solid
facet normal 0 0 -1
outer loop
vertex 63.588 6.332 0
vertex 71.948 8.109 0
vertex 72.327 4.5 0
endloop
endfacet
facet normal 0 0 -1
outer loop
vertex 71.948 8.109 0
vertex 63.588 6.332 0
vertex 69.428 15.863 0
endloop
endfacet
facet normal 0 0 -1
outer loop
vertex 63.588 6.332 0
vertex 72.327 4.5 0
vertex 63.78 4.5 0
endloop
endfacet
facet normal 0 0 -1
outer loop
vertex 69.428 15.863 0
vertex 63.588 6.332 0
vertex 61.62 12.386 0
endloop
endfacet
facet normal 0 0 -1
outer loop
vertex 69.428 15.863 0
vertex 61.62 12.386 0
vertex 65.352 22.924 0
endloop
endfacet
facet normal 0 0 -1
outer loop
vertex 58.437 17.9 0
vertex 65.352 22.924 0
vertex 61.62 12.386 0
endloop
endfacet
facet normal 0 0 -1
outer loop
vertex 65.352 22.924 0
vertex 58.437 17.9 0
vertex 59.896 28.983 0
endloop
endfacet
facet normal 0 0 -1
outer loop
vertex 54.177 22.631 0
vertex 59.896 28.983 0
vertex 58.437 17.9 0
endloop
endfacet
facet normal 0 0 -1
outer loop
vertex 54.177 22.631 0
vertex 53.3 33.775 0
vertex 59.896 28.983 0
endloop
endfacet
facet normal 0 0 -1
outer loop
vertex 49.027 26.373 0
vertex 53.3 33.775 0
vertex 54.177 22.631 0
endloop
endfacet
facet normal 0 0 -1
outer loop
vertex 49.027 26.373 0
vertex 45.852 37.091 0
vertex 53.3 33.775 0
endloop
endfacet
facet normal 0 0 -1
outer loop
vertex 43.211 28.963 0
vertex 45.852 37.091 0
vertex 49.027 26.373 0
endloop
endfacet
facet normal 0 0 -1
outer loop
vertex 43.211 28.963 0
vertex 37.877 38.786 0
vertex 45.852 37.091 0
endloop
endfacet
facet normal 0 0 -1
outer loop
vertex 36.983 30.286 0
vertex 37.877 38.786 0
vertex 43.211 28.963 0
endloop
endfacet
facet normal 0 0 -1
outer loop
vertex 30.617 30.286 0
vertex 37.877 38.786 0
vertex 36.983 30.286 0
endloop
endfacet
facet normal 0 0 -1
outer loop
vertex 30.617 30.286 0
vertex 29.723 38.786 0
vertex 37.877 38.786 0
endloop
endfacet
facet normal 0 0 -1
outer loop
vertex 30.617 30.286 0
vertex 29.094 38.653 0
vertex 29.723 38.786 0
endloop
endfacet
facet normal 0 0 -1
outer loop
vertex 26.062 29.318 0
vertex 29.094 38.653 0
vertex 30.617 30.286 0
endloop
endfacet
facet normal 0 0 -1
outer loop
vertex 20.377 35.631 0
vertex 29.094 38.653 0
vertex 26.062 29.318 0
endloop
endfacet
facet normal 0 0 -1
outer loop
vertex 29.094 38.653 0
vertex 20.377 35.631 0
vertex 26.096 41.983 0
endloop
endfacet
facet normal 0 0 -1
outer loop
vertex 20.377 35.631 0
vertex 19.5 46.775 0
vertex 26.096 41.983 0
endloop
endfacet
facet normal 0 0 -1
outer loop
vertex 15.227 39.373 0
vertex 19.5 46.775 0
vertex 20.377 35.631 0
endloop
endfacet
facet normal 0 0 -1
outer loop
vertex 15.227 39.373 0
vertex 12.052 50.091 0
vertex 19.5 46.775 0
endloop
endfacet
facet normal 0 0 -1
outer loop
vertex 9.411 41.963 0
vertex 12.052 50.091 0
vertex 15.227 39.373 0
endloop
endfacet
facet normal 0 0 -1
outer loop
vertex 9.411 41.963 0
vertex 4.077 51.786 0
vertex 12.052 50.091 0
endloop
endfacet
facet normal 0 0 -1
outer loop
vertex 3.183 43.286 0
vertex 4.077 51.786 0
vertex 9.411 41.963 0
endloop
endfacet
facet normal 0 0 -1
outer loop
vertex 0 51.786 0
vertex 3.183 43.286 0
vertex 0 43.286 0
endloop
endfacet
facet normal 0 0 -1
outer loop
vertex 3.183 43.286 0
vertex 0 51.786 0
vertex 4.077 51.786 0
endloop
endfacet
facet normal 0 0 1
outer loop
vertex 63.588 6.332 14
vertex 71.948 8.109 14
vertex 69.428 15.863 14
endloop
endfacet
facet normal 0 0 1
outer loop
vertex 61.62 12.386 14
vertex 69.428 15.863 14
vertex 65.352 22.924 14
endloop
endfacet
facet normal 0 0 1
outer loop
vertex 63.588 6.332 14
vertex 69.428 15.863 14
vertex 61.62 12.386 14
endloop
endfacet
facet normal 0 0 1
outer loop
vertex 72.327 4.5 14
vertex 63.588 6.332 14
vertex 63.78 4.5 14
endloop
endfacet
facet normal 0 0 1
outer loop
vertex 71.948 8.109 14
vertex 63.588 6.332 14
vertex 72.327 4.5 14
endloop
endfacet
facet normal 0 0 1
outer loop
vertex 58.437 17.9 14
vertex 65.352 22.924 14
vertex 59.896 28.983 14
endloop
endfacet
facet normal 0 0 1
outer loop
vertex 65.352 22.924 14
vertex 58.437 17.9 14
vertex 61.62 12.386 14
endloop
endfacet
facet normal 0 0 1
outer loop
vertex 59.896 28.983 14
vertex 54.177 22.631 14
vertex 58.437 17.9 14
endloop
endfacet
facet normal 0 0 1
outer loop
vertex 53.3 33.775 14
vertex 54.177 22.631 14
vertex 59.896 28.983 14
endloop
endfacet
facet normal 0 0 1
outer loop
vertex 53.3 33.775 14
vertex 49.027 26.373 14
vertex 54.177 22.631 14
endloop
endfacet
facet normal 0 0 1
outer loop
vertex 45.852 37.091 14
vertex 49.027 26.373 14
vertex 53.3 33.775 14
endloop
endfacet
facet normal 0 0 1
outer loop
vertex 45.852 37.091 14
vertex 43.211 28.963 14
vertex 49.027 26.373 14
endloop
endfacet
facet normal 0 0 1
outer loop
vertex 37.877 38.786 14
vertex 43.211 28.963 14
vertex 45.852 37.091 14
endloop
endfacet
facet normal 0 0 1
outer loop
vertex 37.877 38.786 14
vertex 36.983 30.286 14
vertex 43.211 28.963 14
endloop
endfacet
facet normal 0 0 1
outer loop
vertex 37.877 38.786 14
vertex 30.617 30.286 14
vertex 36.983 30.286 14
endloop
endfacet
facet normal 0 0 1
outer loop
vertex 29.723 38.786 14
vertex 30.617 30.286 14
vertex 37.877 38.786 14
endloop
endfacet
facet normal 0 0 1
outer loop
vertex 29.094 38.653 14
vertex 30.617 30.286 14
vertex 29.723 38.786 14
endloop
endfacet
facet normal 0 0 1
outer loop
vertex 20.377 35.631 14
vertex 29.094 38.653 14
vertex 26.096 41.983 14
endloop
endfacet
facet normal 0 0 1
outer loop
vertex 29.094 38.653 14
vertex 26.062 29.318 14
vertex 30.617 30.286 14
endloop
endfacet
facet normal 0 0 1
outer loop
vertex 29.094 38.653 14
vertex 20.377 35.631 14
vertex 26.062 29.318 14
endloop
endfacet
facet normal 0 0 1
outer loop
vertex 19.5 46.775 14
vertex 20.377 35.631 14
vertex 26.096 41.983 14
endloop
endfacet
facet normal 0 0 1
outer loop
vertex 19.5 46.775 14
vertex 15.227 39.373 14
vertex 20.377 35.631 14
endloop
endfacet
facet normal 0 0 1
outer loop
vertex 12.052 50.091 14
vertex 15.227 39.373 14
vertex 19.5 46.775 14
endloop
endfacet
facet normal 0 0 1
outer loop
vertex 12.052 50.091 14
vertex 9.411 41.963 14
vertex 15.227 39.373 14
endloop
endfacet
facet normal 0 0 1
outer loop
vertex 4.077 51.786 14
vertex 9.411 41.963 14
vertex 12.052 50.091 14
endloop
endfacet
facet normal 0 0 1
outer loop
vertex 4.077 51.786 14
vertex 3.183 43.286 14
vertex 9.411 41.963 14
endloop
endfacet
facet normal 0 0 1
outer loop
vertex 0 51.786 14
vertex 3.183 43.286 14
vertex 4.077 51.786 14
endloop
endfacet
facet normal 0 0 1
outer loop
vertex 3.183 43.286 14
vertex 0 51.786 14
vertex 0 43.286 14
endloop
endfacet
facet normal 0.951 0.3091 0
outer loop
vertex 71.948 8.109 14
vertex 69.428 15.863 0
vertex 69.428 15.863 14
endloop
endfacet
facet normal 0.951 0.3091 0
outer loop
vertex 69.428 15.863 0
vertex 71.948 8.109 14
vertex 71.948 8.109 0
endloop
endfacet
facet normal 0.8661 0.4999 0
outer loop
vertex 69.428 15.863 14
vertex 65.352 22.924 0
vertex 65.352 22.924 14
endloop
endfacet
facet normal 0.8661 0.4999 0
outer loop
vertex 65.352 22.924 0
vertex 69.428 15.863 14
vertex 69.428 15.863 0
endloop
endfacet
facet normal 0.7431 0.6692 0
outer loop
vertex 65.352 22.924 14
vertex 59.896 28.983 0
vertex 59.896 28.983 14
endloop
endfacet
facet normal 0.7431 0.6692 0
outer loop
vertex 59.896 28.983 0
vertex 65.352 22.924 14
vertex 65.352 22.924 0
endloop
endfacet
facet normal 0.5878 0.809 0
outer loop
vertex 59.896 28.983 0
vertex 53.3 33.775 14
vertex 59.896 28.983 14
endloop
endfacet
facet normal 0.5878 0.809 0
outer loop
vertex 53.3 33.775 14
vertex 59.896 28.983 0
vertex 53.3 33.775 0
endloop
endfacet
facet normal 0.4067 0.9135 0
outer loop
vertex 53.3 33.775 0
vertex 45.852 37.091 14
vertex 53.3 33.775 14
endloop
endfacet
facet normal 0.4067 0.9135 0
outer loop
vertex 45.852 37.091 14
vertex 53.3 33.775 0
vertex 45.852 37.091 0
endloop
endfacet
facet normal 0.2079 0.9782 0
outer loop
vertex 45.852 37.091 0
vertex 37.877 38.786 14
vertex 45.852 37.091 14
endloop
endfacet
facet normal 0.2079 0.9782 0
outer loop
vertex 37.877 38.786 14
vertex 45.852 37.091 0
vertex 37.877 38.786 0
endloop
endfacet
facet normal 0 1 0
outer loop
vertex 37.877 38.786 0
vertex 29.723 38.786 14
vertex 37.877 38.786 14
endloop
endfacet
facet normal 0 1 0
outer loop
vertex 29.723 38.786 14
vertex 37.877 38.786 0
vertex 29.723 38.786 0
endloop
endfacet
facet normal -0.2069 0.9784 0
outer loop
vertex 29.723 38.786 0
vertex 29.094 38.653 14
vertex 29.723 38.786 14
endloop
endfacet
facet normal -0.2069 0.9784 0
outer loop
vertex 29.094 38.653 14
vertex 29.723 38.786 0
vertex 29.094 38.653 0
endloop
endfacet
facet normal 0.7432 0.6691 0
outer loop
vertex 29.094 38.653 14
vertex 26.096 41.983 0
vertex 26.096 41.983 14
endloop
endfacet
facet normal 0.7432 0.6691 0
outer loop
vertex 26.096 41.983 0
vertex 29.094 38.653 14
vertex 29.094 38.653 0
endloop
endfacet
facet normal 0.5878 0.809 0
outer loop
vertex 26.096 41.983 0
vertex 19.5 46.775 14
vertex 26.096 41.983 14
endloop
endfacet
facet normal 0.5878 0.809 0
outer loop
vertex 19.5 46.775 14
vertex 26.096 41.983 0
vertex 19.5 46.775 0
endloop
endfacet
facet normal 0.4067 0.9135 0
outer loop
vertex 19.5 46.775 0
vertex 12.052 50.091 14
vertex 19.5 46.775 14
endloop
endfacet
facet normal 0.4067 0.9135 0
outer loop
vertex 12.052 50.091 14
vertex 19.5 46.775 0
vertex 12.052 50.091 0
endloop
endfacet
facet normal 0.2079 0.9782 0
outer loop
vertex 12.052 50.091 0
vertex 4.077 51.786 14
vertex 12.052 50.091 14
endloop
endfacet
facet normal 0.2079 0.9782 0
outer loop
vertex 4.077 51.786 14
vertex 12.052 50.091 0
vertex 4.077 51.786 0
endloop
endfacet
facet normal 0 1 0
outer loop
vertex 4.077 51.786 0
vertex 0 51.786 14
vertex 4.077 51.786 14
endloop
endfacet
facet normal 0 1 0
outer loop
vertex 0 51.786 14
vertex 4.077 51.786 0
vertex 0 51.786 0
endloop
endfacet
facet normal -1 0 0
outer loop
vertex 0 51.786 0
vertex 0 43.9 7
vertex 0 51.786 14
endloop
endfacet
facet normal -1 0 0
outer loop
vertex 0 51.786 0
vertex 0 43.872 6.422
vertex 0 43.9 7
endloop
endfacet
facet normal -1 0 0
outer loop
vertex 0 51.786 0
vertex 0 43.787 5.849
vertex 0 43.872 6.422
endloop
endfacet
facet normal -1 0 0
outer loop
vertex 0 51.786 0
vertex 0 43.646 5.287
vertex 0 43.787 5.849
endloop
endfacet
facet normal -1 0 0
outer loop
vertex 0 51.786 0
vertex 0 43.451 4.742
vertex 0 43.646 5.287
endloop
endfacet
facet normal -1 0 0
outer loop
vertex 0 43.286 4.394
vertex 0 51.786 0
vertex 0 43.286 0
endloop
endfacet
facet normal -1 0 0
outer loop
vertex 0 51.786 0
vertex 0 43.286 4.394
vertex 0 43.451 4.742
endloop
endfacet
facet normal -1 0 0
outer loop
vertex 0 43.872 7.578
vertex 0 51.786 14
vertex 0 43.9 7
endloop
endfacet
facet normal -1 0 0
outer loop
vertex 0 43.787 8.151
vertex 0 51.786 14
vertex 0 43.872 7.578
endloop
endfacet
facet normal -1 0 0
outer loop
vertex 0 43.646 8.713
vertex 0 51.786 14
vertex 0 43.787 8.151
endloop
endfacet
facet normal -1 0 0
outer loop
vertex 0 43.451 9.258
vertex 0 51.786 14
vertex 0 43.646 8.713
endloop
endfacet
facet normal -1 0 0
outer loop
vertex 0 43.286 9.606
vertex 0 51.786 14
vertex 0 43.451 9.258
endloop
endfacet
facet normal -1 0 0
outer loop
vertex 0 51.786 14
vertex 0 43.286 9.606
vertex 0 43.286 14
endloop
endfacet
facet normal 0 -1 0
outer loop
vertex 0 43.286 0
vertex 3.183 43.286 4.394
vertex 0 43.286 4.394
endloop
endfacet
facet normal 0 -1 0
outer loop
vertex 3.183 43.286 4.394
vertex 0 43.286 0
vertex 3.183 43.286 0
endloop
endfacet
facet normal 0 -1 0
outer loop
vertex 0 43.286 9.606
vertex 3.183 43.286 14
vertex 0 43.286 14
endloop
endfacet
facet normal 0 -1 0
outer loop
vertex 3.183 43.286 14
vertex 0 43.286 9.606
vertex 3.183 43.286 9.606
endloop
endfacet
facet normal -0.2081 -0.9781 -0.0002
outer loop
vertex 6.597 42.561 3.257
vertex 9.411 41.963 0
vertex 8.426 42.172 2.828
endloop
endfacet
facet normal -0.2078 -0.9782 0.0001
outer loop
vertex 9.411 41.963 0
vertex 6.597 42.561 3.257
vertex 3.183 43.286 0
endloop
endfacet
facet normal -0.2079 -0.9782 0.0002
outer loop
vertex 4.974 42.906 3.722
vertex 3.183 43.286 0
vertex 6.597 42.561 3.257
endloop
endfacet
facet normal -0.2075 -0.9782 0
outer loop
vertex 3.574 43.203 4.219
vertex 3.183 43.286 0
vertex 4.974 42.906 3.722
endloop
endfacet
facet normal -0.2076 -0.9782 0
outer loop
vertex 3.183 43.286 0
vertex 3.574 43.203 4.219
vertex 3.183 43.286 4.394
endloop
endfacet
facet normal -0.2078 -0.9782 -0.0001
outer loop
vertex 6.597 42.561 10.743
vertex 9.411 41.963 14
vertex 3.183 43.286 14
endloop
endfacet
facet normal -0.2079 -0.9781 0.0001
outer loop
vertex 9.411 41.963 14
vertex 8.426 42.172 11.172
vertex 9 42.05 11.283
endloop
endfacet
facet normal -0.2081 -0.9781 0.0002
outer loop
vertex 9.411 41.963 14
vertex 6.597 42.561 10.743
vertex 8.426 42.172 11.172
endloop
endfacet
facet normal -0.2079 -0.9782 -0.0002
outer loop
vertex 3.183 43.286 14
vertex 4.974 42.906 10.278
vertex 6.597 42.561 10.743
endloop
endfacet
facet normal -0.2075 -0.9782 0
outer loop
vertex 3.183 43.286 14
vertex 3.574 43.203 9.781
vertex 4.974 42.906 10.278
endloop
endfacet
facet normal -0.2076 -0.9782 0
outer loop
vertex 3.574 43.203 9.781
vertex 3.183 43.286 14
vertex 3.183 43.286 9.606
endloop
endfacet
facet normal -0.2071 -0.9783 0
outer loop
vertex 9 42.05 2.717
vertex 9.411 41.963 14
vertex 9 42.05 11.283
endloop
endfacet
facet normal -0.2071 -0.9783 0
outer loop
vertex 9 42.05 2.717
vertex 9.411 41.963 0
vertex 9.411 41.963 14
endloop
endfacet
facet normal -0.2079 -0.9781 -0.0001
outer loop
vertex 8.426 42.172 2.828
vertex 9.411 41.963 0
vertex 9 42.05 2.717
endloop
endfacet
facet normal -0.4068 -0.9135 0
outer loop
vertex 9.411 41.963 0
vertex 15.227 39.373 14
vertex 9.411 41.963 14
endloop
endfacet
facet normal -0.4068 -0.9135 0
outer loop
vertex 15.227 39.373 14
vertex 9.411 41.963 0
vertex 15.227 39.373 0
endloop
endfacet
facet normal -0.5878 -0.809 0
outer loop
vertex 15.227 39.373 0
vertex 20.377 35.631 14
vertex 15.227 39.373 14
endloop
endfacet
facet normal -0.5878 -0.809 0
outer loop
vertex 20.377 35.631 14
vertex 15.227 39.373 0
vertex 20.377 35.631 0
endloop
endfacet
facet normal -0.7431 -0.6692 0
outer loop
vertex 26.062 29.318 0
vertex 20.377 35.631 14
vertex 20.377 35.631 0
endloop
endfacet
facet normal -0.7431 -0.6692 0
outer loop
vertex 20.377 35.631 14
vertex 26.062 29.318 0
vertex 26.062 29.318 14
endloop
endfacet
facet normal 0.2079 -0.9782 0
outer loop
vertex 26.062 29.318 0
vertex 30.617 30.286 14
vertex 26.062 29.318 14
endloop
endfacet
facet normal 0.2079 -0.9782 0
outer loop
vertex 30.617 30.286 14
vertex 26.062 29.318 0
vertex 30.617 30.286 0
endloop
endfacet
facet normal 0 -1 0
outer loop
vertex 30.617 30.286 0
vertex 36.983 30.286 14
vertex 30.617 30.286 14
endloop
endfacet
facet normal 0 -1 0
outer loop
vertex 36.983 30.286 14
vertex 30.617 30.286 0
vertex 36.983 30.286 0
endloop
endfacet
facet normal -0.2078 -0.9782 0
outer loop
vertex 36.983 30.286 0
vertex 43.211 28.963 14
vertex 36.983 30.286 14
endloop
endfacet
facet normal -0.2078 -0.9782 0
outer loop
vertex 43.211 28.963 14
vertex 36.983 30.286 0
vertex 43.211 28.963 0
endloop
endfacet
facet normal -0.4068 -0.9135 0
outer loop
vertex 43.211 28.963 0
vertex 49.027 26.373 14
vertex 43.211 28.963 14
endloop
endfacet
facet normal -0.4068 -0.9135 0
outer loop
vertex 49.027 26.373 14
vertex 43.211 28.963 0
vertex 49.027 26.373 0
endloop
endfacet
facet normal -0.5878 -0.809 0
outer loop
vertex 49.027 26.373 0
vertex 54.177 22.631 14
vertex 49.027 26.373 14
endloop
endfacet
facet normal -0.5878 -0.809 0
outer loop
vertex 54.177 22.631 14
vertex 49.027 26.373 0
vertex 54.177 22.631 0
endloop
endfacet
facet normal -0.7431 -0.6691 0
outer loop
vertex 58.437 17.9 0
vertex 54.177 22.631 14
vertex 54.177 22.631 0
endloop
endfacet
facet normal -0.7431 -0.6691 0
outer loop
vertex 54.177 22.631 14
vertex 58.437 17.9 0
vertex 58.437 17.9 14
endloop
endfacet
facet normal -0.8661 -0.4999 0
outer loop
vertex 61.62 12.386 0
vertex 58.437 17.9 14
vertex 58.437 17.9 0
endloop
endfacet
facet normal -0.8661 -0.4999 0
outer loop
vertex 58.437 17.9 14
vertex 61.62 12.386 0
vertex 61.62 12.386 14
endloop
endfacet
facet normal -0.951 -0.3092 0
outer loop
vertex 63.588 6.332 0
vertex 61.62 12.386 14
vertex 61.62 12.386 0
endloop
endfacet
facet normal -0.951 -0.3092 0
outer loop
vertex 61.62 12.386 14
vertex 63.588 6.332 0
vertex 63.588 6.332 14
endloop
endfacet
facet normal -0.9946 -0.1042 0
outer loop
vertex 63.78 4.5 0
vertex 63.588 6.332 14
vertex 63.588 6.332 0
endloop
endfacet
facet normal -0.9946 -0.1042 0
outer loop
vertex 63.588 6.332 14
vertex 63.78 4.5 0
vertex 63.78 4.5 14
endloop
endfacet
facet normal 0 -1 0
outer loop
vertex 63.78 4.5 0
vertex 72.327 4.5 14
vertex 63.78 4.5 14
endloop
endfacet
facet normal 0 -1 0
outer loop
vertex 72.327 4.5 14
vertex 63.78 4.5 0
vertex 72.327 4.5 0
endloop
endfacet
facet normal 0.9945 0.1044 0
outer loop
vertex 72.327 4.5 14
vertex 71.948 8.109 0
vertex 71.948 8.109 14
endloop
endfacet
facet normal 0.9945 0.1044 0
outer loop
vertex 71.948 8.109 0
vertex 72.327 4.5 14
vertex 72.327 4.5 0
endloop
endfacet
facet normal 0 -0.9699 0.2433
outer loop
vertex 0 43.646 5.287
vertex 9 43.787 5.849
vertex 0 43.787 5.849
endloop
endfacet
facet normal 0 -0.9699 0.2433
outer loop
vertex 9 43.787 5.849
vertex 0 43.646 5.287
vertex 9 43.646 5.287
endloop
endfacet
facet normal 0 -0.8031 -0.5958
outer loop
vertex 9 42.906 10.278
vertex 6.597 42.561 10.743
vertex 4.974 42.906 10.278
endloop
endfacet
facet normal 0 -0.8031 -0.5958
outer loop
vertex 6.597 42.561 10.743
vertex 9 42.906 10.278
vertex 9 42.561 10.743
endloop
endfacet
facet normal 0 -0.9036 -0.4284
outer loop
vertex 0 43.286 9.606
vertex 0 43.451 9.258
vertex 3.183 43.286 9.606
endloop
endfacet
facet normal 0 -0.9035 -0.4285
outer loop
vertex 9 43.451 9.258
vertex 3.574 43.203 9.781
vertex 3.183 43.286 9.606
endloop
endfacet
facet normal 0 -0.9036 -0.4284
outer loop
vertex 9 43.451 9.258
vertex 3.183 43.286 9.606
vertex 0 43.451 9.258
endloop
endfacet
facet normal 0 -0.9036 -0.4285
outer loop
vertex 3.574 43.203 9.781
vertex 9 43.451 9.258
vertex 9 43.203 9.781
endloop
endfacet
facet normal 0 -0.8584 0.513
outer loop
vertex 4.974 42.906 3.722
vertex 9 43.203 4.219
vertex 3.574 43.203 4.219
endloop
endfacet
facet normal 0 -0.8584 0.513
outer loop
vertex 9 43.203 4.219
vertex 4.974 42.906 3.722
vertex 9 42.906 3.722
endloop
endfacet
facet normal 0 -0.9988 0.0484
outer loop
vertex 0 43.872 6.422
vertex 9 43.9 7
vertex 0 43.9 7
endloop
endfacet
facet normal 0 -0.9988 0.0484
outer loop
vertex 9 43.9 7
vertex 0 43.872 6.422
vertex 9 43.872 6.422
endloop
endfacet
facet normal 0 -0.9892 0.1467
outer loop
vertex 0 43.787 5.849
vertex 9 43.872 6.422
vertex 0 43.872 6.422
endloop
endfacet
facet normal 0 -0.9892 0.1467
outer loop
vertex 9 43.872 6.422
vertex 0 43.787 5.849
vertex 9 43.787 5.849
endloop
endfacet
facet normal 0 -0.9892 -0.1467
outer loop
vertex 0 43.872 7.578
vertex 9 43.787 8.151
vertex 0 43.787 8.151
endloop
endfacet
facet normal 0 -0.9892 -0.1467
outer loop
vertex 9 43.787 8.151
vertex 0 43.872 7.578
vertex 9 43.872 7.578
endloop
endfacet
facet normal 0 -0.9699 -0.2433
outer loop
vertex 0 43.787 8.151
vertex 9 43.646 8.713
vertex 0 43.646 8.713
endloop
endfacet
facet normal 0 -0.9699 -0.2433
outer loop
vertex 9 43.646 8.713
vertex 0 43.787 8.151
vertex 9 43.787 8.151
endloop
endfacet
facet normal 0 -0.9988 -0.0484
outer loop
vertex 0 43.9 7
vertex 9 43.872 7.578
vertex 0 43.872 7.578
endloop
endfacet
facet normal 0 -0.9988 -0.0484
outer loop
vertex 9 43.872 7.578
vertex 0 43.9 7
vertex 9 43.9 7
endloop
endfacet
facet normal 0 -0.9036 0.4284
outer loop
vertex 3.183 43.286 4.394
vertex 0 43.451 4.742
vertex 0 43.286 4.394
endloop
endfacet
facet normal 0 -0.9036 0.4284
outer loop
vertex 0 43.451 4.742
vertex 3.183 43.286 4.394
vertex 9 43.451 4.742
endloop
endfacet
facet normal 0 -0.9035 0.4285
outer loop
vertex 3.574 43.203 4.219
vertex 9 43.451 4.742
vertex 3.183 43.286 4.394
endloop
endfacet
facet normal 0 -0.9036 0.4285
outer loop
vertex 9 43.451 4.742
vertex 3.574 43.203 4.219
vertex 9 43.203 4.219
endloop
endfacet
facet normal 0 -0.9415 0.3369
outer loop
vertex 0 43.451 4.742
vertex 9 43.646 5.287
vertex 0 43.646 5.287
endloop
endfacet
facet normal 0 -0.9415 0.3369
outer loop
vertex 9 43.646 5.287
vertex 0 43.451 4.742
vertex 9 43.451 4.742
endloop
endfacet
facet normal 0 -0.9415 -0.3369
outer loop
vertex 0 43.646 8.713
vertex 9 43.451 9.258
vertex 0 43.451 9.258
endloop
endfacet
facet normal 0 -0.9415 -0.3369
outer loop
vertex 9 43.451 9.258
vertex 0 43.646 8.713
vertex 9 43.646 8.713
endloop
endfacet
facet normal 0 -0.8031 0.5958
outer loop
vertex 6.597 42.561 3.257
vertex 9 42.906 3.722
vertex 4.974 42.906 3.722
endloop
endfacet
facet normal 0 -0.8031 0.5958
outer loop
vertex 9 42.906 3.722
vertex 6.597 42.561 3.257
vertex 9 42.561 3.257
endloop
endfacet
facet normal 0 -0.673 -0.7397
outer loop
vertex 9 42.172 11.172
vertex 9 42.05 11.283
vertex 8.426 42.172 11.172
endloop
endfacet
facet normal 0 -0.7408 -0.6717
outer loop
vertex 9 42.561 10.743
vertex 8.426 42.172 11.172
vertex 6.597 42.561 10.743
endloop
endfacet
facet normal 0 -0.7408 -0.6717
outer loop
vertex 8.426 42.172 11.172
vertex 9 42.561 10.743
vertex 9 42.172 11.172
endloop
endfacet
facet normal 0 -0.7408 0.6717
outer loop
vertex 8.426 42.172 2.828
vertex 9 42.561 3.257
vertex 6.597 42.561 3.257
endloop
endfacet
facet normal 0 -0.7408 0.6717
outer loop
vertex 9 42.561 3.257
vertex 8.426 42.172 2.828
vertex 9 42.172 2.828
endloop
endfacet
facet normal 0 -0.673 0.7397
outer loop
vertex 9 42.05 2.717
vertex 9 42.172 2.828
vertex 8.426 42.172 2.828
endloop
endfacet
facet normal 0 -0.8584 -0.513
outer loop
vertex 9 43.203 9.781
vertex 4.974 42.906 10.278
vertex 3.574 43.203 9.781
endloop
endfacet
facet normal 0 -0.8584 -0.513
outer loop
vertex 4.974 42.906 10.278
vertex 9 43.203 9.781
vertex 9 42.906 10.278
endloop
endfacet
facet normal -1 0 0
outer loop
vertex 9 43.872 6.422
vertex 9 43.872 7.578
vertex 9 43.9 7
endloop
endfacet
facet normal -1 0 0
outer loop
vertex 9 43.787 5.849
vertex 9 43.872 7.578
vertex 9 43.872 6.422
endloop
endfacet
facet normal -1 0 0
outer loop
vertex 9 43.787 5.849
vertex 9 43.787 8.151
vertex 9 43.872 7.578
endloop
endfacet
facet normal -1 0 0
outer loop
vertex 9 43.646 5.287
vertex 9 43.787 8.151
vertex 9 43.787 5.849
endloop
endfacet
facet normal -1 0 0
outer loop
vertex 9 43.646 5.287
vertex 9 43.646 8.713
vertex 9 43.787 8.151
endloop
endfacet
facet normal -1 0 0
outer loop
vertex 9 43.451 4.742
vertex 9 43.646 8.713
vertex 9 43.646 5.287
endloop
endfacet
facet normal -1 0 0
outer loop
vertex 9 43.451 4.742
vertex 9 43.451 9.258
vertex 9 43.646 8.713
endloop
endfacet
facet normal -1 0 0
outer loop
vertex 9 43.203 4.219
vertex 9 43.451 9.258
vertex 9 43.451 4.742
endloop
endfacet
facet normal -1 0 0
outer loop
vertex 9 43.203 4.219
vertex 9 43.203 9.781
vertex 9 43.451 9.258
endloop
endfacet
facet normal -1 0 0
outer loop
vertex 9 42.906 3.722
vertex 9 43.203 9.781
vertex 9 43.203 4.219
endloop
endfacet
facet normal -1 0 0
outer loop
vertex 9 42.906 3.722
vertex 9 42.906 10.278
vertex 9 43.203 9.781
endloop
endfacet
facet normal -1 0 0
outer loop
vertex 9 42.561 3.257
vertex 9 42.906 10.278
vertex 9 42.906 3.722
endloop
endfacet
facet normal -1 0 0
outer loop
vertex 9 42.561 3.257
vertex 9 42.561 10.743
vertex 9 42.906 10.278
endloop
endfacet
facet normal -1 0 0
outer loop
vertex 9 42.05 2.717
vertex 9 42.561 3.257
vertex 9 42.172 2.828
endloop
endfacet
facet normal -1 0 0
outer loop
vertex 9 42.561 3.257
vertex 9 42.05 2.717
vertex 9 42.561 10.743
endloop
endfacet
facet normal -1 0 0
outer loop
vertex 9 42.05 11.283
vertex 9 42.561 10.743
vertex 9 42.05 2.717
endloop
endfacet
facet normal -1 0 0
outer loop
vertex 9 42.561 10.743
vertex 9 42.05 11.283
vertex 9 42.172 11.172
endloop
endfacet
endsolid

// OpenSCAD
// Heart pen holder — open in OpenSCAD and export STL (F6)
// Profile in XZ, extruded along Y; print with Y=0 face on the bed.
scale = 2.6;
depth = 14;
wall = 8.5;
pen_d = 11.8;
flat_tip = 9;

module heart_2d(s=1) {
  scale(s) {
    union() {
      translate([0, 5, 0]) circle(d=30);
      translate([-13, 0, 0]) circle(d=30);
      translate([13, 0, 0]) circle(d=30);
    }
    translate([0, -8, 0]) square([40, 20], center=true);
  }
}

difference() {
  linear_extrude(depth)
    difference() {
      intersection() {
        heart_2d(scale);
        translate([0, flat_tip / 2, 0]) square([120, 80], center=false);
      }
      offset(delta=-wall) heart_2d(scale);
    }
  translate([0, 38 * scale / 2.6, depth / 2]) rotate([0, 90, 0])
    cylinder(h=depth + 4, d=pen_d, center=true, $fn=64);
}
